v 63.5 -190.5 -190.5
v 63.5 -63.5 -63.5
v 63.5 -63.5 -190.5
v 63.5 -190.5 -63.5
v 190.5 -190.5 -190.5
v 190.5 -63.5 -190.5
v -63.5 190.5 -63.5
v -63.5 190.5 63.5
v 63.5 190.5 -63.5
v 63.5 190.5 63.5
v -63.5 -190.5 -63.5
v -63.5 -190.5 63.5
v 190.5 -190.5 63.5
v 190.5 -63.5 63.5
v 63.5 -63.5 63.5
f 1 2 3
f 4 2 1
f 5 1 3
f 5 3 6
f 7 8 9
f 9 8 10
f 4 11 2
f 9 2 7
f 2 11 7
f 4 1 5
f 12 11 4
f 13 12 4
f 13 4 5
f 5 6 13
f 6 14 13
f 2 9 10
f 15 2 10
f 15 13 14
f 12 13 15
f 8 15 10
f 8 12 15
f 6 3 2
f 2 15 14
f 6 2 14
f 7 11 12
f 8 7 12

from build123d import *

# Parameters (mm, degrees)
F1_W     = 127
F1_H     = 127
F2_DEPTH = 190.5
F3_W     = 127
F3_H     = 127
F4_DEPTH = 127
F5_W     = 127
F5_H     = 127
F6_DEPTH = 127


# Not quite as in the source:
# - a variable given as a bare number and used for a length is read in inches; the dataset says mm whatever the document's units were


with BuildPart() as f2:
    # F1 (on Front) → F2 (new body, symmetric)
    with BuildSketch(Plane.XZ):
        Rectangle(F1_W, F1_H)
    extrude(amount=F2_DEPTH, both=True)

    # F3 (on face) → F4 (join)
    with BuildSketch(Plane.YZ.offset(63.5)):
        with Locations((-127, 0)):
            Rectangle(F3_W, F3_H)
    extrude(amount=F4_DEPTH)

    # F5 (on face) → F6 (join)
    with BuildSketch(Plane(origin=(0, 0, -63.5), x_dir=(1, 0, 0), z_dir=(0, 0, -1))):
        with Locations((127, 127)):
            Rectangle(F5_W, F5_H)
    extrude(amount=F6_DEPTH)


solid = f2.part
